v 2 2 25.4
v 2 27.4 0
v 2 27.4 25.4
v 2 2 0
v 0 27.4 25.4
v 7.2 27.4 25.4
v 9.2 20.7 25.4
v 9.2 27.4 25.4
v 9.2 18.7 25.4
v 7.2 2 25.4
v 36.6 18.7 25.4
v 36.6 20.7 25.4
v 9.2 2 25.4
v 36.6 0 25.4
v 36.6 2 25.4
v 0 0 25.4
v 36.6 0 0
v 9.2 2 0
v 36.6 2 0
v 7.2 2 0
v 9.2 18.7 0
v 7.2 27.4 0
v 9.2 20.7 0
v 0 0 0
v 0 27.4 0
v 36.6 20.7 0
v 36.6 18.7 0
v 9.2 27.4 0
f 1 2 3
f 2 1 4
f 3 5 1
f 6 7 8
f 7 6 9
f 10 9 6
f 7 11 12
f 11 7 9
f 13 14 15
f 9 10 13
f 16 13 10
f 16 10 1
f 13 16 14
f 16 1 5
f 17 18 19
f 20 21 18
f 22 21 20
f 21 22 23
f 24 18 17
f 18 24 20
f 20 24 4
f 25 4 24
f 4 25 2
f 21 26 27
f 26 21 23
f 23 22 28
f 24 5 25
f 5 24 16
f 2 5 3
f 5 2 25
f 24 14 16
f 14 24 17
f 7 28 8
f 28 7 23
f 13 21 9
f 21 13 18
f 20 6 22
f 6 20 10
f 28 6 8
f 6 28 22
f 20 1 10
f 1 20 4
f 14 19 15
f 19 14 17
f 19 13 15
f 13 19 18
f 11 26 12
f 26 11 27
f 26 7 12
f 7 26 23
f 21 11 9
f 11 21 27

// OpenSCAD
module kallax_backer_bracket(
    wall = 2,

    height = 25.4,

    backer_hold_depth = 25.4,
    shelf_hold_depth = 25.4,

    backer_thickness = 5,
    shelf_thickness = 16.5,

    tolerance = .1
) {
    e = .0941;

    backer_width = backer_thickness + (wall + tolerance) * 2;

    function get_xys(thickness) = [0, wall + thickness + tolerance * 2];

    module _backer_hold() {
        for (x = get_xys(backer_thickness)) {
            translate([x, 0, 0]) {
                cube([wall, backer_hold_depth + wall, height]);
            }
        }

        cube([backer_width, wall, height]);
    }

    module _shelf_hold() {
        for (y = get_xys(shelf_thickness)) {
            translate([backer_width - e, y, 0]) {
                cube([shelf_hold_depth + wall + e, wall, height]);
            }
        }
    }

    _backer_hold();
    _shelf_hold();
}

kallax_backer_bracket();
